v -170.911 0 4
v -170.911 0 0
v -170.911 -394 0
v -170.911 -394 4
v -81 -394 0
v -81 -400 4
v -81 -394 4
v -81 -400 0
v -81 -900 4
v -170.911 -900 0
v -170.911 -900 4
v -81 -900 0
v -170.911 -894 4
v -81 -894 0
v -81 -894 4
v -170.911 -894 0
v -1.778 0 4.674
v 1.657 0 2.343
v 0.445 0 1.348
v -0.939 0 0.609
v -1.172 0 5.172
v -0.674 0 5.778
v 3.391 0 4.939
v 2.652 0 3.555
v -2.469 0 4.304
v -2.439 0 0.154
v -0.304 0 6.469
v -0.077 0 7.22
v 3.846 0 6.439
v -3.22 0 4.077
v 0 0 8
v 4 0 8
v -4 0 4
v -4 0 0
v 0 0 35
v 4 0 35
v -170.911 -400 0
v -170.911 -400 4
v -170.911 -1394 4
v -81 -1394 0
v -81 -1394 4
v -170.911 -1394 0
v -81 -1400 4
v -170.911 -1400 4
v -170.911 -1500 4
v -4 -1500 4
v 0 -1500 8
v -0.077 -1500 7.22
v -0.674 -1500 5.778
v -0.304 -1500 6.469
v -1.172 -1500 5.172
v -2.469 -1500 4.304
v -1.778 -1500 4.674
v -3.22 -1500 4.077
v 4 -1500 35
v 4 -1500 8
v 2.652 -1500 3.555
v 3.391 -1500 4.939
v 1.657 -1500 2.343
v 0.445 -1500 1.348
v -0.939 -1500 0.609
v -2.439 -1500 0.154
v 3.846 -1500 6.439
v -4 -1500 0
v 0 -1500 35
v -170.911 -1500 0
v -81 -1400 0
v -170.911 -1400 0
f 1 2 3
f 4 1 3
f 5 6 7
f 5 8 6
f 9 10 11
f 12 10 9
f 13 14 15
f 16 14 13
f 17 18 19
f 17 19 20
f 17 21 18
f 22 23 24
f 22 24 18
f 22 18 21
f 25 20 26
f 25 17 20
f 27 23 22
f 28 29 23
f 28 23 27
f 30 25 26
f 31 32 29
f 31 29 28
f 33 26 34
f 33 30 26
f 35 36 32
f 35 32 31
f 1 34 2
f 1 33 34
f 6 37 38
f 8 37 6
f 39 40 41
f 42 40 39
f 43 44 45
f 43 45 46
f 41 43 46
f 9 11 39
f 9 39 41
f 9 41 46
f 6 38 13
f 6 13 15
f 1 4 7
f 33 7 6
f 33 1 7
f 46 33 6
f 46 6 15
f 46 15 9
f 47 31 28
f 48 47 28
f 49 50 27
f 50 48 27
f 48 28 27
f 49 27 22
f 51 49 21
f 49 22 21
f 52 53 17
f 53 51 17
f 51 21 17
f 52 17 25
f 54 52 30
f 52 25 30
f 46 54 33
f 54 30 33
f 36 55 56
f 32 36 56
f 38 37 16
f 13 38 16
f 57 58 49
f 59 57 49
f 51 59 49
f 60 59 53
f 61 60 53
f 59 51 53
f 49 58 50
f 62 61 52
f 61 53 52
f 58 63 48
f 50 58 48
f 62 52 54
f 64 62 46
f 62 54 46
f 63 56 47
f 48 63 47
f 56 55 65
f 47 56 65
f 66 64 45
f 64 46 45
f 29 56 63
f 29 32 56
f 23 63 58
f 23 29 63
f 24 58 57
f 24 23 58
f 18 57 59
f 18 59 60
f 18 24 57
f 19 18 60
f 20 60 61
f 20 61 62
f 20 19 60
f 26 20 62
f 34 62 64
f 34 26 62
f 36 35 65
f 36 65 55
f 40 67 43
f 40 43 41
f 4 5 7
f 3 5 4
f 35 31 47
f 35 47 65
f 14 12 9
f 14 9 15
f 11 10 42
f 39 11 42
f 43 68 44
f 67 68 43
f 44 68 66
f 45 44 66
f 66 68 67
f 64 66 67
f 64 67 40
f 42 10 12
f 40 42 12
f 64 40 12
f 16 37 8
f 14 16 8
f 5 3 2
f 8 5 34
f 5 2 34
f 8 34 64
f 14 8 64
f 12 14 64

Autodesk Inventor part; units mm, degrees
ref_plane "YZ Plane" through (0, 0, 0) normal (1, 0, 0) x (0, 1, 0)
ref_plane "XZ Plane" through (0, 0, 0) normal (0, 1, 0) x (-1, 0, 0)
ref_plane "XY Plane" through (0, 0, 0) normal (0, 0, 1) x (1, 0, 0)
sketch "Sketch1" plane through (0, 0, 0) normal (0, 0, 1) x (1, 0, 0)
  line L0 (0, 0) -> (-170.9112, 0)
  line L1 (-170.9112, 0) -> (-170.9112, -1500)
  line L2 (-170.9112, -1500) -> (0, -1500)
  line L3 (0, -1500) -> (0, 0)
  line L4 (-170.9112, -1400) -> (-81, -1400)
  line L5 (-81, -1400) -> (-81, -1394)
  line L6 (-81, -1394) -> (-170.9112, -1394)
  line L7 (-170.9112, -1394) -> (-170.9112, -1400)
  line L8 (-170.9112, -900) -> (-81, -900)
  line L9 (-81, -900) -> (-81, -894)
  line L10 (-81, -894) -> (-170.9112, -894)
  line L11 (-170.9112, -894) -> (-170.9112, -900)
  line L12 (-170.9112, -400) -> (-81, -400)
  line L13 (-81, -400) -> (-81, -394)
  line L14 (-81, -394) -> (-170.9112, -394)
  line L15 (-170.9112, -394) -> (-170.9112, -400)
  point P0 (-170.9112, -400)
  dimension "d0" = 1500
  dimension "d1" = 170.9112
  dimension "d2" = 6
  dimension "d4" = 100
  dimension "d7" = 500
  dimension "d23" = 81
extrude "Plate1" add sketch "Sketch1" along normal blind 4 contours L3 L2 L1 L4 L5 L6 L8 L9 L10 L12 L13 L14 L0
sketch "Sketch2" plane through (4, 0, 0) normal (-1, 0, 0) x (0, -1, 0)
  line L0 (1500, 0) -> (0, 0)
  line L1 (0, 0) -> (0, 35)
  line L2 (0, 35) -> (1500, 35)
  line L3 (1500, 35) -> (1500, 0)
edge flange "Flange1" height 35 angle 90 thickness 4 bend radius 4 thickness toward (-1, 0, 0) relief tear relief width 4 relief depth 2 edges at (0, -750, 4) wall of the first edge with corners at (4, -1500, 0) (4, 0, 0) (4, 0, 35) (4, -1500, 35)
bend "Bend1"
corner "Corner1"
equation "\"d1\" = Stringer3_deep"
equation "\"d12\" = Thickness"
equation "\"d13\" = BendReliefWidth"
equation "\"d14\" = BendReliefDepth"
equation "\"d15\" = MinimumRemnant"
equation "\"d16\" = TransitionRadius"
equation "\"d19\" = BendRadius"
equation "\"d20\" = CornerReliefSize"
equation "\"d21\" = GapSize"
equation "\"d22\" = JacobiRadiusSize"
equation "\"BendRadius\" = Thickness"
equation "\"BendReliefWidth\" = Thickness"
equation "\"BendReliefDepth\" = 0.5 * Thickness"
equation "\"CornerReliefSize\" = 4 * Thickness"
equation "\"MinimumRemnant\" = 2 * Thickness"
equation "\"TransitionRadius\" = BendRadius"
equation "\"JacobiRadiusSize\" = BendRadius"
equation "\"GapSize\" = Thickness"
equation "\"Stringer3_deep\" = 170.911249"
equation "\"Thickness\" = 4"
properties part number "stringer 1.3" material "Steel"
